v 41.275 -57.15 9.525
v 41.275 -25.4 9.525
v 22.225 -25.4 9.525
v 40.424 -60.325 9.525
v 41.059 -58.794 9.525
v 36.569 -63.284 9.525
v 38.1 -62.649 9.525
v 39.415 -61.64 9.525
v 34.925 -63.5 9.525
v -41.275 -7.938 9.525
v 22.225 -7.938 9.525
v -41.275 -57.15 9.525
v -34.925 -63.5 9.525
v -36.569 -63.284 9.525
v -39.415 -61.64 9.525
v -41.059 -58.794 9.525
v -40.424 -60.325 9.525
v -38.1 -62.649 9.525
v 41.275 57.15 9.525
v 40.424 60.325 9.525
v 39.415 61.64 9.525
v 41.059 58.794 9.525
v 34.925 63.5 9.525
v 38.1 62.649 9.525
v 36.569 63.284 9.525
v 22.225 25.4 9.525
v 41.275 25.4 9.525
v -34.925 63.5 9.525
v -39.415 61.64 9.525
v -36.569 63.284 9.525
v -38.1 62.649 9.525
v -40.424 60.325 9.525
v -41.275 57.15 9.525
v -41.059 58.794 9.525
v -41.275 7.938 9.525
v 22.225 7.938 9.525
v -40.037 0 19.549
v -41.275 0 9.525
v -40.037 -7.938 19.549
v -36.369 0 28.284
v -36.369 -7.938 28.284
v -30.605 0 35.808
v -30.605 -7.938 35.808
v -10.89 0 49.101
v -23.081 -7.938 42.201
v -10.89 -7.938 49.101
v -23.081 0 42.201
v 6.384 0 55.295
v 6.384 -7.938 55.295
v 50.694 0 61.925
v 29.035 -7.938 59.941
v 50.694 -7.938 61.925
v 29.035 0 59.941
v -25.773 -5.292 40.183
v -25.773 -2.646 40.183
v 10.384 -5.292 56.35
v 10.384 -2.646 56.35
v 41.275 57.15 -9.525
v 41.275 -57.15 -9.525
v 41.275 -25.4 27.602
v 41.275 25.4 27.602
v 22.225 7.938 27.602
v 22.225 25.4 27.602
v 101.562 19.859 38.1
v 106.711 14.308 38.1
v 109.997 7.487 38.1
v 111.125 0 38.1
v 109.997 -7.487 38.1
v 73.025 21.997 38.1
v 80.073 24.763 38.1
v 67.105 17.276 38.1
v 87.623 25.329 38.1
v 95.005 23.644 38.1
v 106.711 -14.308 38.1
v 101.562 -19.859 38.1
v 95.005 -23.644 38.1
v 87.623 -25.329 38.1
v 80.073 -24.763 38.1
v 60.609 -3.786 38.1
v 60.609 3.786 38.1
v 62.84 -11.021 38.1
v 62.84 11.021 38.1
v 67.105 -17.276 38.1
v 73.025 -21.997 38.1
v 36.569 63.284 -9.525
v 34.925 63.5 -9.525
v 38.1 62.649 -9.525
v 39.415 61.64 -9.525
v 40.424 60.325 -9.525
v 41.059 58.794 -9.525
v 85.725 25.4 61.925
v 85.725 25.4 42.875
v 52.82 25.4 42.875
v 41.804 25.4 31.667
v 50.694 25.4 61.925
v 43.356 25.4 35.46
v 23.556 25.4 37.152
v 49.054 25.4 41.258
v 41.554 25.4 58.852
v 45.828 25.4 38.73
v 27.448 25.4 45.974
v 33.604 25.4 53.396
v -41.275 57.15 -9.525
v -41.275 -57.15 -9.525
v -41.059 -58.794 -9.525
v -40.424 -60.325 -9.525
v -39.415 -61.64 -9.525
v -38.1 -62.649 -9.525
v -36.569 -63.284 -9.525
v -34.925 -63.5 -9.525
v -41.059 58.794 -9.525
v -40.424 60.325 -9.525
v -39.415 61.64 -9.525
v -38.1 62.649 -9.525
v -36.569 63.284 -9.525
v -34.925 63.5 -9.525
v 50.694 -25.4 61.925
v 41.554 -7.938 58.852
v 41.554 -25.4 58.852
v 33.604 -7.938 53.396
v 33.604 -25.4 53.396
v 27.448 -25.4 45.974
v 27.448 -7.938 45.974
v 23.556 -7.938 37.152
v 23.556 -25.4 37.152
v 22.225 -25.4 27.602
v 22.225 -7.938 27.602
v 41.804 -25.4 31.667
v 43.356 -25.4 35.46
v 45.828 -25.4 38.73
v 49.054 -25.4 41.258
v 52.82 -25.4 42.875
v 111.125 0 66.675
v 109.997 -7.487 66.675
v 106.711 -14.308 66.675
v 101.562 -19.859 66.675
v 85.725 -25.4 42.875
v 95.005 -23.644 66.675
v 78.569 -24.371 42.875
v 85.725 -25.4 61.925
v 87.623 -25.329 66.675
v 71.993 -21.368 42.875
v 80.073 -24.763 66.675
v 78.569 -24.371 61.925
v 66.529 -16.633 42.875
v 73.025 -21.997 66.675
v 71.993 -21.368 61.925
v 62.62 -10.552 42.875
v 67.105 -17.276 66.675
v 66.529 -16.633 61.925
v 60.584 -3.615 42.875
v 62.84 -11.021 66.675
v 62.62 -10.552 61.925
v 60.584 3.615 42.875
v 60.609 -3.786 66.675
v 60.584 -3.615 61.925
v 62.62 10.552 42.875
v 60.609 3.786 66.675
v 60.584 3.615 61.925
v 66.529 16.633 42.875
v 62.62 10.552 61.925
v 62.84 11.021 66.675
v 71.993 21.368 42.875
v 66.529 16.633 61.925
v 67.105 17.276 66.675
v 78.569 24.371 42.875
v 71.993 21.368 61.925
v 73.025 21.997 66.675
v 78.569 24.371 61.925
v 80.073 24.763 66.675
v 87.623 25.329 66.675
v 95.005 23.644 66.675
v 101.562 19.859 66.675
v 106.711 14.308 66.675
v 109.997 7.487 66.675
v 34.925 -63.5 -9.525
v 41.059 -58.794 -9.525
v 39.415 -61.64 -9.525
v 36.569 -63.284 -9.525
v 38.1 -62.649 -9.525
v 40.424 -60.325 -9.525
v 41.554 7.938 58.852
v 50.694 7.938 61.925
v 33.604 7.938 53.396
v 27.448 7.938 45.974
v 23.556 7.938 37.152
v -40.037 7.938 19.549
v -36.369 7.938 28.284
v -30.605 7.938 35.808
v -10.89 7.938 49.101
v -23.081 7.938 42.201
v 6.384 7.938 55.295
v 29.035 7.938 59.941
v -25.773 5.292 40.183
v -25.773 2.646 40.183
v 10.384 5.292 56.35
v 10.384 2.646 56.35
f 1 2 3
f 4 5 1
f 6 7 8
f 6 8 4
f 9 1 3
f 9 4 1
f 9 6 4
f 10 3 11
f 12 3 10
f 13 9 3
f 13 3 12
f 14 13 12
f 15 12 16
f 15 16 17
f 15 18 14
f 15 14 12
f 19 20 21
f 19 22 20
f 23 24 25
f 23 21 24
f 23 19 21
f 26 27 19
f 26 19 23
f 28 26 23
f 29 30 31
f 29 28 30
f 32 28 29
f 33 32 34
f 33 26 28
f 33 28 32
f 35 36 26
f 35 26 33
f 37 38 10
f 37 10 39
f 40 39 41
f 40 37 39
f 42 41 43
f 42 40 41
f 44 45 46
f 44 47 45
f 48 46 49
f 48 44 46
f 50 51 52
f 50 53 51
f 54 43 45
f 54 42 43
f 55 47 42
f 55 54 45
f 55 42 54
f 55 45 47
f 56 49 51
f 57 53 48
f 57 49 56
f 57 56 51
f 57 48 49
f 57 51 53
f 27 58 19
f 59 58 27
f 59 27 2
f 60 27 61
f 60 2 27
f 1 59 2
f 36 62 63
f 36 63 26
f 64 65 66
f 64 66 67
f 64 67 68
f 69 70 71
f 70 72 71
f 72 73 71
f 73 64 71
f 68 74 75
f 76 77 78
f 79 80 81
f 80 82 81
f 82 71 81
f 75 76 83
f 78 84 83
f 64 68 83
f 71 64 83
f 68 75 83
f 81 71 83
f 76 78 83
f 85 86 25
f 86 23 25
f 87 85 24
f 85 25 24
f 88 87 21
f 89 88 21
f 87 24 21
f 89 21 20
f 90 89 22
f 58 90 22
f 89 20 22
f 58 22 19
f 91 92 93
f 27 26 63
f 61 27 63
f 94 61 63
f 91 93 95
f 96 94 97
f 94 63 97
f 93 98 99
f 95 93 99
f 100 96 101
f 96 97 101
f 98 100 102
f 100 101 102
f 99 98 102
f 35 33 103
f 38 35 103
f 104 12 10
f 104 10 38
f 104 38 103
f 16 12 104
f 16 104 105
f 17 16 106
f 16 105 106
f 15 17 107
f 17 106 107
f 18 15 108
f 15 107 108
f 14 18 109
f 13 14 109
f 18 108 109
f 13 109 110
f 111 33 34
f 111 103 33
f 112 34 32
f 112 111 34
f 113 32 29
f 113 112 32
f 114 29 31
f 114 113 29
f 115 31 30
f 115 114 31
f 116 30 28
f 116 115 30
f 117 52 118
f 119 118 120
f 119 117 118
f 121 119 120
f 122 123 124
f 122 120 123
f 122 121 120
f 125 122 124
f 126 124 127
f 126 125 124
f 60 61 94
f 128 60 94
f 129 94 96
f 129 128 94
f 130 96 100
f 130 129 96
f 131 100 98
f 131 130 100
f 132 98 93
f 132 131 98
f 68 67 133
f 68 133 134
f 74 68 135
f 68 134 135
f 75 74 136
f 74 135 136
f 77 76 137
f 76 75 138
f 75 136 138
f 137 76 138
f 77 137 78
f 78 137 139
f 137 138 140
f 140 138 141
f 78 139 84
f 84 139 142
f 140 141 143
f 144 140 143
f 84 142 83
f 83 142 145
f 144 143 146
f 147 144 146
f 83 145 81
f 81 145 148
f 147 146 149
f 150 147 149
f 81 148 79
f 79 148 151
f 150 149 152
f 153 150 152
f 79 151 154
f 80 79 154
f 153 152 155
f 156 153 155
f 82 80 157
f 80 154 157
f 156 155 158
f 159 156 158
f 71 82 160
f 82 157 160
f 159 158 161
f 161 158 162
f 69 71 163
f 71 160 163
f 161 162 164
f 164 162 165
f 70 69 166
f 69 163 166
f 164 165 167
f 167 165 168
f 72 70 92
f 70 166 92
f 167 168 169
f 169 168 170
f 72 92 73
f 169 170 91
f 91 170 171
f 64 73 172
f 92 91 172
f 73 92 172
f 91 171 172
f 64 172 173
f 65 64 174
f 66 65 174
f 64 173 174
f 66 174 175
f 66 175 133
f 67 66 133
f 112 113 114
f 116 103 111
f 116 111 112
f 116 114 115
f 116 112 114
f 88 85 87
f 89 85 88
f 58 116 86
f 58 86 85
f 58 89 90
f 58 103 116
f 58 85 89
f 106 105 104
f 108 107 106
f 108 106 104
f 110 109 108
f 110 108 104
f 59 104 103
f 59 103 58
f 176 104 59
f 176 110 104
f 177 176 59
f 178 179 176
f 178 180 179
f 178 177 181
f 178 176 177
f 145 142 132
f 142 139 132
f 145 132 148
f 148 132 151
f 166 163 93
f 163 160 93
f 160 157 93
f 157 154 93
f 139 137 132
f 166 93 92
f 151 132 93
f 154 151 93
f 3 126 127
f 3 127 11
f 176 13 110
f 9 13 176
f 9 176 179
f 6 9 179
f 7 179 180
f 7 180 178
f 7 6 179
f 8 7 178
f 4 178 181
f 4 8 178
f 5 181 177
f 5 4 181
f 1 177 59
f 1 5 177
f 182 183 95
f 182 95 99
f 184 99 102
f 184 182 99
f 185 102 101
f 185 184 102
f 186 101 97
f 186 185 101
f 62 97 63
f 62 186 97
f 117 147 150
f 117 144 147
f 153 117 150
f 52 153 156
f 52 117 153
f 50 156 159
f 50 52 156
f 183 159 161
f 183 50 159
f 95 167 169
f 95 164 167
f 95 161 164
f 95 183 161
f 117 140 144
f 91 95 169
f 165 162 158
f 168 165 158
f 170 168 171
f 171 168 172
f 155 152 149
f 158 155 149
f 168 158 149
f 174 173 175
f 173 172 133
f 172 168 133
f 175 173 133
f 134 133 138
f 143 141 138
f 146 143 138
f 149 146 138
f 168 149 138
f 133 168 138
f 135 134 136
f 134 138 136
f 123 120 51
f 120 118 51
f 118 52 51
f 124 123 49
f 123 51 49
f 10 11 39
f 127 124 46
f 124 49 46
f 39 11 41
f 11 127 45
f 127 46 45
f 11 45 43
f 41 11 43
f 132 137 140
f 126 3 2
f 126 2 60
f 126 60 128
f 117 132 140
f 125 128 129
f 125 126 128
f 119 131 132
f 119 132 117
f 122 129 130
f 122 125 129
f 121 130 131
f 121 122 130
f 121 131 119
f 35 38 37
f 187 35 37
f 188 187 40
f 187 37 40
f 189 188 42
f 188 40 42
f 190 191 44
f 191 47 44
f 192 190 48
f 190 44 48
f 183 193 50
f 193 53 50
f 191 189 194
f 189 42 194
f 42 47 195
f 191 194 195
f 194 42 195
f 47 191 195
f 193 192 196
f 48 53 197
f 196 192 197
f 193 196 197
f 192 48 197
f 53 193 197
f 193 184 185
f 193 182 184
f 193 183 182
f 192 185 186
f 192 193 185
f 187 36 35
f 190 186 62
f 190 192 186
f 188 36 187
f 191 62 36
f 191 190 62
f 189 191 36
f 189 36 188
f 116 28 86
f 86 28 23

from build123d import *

# Parameters (mm, degrees)
F1_DEPTH  = 63.5
F2_DEPTH  = 25.4
F3_DEPTH  = 7.9375
F4_R      = 6.35
F2_FACE_W = 50.8
F2_FACE_H = 19.05
F5_DEPTH  = 25.4


with BuildPart() as f1:
    # F0 (on Front) → F1 (new body, symmetric)
    with BuildSketch(Plane.XZ):
        Polygon((22.225, 9.525), (-41.275, 9.525), (-41.275, -9.525), (41.275, -9.525), (41.275, 9.525), align=None)
    extrude(amount=F1_DEPTH, both=True)

    # F0 (on Front) → F2 (join, symmetric)
    with BuildSketch(Plane.XZ):
        with BuildLine():
            Line((22.225, 27.602186), (22.225, 9.525))
            Line((22.225, 9.525), (41.275, 9.525))
            Line((41.275, 9.525), (41.275, 27.602186))
            ThreePointArc((41.275, 27.602186), (44.485924, 37.174898), (52.819795, 42.8752))
            Line((52.819795, 42.8752), (60.325, 42.8752))
            Line((60.325, 42.8752), (60.325, 61.9252))
            Line((60.325, 61.9252), (50.693503, 61.9252))
            ThreePointArc((50.693503, 61.9252), (30.268326, 49.898626), (22.225, 27.602186))
        make_face()
    extrude(amount=F2_DEPTH, both=True)

    # F0 (on Front) → F3 (join, symmetric)
    with BuildSketch(Plane.XZ):
        with BuildLine():
            add(Edge.make_bspline(
                [(-41.275, 9.525), (-41.602355, 48.730145), (13.809814, 60.34423), (50.693503, 61.9252)],
                knots=[0, 0, 0, 0, 105.848885, 105.848885, 105.848885, 105.848885], degree=3))
            Line((-41.275, 9.525), (22.225, 9.525))
            Line((22.225, 9.525), (22.225, 27.602186))
            ThreePointArc((22.225, 27.602186), (30.268326, 49.898626), (50.693503, 61.9252))
        make_face()
    extrude(amount=F3_DEPTH, both=True)

    # F4
    f4_edges = [f1.edges().sort_by_distance(p)[0] for p in [
        (41.275, -63.5, 0),
        (-41.275, -63.5, 0),
        (41.275, 63.5, 0),
        (-41.275, 63.5, 0),
    ]]
    fillet(f4_edges, radius=F4_R)

    # F2_face (on face) → F5 (join)
    with BuildSketch(Plane(origin=(60.325, 0, 52.4002), x_dir=(0, 1, 0), z_dir=(1, 0, 0))):
        Rectangle(F2_FACE_W, F2_FACE_H)
    extrude(amount=F5_DEPTH)

    # F0 (on Front) → F6 (revolve)
    with BuildSketch(Plane.XZ):
        Polygon((85.725, 66.675), (85.725, 61.9252), (85.725, 42.8752), (85.725, 38.1), (111.125, 38.1), (111.125, 66.675), align=None)
    revolve(axis=Axis((85.725, 0, 52.3875), (0, 0, -1)))


solid = f1.part
